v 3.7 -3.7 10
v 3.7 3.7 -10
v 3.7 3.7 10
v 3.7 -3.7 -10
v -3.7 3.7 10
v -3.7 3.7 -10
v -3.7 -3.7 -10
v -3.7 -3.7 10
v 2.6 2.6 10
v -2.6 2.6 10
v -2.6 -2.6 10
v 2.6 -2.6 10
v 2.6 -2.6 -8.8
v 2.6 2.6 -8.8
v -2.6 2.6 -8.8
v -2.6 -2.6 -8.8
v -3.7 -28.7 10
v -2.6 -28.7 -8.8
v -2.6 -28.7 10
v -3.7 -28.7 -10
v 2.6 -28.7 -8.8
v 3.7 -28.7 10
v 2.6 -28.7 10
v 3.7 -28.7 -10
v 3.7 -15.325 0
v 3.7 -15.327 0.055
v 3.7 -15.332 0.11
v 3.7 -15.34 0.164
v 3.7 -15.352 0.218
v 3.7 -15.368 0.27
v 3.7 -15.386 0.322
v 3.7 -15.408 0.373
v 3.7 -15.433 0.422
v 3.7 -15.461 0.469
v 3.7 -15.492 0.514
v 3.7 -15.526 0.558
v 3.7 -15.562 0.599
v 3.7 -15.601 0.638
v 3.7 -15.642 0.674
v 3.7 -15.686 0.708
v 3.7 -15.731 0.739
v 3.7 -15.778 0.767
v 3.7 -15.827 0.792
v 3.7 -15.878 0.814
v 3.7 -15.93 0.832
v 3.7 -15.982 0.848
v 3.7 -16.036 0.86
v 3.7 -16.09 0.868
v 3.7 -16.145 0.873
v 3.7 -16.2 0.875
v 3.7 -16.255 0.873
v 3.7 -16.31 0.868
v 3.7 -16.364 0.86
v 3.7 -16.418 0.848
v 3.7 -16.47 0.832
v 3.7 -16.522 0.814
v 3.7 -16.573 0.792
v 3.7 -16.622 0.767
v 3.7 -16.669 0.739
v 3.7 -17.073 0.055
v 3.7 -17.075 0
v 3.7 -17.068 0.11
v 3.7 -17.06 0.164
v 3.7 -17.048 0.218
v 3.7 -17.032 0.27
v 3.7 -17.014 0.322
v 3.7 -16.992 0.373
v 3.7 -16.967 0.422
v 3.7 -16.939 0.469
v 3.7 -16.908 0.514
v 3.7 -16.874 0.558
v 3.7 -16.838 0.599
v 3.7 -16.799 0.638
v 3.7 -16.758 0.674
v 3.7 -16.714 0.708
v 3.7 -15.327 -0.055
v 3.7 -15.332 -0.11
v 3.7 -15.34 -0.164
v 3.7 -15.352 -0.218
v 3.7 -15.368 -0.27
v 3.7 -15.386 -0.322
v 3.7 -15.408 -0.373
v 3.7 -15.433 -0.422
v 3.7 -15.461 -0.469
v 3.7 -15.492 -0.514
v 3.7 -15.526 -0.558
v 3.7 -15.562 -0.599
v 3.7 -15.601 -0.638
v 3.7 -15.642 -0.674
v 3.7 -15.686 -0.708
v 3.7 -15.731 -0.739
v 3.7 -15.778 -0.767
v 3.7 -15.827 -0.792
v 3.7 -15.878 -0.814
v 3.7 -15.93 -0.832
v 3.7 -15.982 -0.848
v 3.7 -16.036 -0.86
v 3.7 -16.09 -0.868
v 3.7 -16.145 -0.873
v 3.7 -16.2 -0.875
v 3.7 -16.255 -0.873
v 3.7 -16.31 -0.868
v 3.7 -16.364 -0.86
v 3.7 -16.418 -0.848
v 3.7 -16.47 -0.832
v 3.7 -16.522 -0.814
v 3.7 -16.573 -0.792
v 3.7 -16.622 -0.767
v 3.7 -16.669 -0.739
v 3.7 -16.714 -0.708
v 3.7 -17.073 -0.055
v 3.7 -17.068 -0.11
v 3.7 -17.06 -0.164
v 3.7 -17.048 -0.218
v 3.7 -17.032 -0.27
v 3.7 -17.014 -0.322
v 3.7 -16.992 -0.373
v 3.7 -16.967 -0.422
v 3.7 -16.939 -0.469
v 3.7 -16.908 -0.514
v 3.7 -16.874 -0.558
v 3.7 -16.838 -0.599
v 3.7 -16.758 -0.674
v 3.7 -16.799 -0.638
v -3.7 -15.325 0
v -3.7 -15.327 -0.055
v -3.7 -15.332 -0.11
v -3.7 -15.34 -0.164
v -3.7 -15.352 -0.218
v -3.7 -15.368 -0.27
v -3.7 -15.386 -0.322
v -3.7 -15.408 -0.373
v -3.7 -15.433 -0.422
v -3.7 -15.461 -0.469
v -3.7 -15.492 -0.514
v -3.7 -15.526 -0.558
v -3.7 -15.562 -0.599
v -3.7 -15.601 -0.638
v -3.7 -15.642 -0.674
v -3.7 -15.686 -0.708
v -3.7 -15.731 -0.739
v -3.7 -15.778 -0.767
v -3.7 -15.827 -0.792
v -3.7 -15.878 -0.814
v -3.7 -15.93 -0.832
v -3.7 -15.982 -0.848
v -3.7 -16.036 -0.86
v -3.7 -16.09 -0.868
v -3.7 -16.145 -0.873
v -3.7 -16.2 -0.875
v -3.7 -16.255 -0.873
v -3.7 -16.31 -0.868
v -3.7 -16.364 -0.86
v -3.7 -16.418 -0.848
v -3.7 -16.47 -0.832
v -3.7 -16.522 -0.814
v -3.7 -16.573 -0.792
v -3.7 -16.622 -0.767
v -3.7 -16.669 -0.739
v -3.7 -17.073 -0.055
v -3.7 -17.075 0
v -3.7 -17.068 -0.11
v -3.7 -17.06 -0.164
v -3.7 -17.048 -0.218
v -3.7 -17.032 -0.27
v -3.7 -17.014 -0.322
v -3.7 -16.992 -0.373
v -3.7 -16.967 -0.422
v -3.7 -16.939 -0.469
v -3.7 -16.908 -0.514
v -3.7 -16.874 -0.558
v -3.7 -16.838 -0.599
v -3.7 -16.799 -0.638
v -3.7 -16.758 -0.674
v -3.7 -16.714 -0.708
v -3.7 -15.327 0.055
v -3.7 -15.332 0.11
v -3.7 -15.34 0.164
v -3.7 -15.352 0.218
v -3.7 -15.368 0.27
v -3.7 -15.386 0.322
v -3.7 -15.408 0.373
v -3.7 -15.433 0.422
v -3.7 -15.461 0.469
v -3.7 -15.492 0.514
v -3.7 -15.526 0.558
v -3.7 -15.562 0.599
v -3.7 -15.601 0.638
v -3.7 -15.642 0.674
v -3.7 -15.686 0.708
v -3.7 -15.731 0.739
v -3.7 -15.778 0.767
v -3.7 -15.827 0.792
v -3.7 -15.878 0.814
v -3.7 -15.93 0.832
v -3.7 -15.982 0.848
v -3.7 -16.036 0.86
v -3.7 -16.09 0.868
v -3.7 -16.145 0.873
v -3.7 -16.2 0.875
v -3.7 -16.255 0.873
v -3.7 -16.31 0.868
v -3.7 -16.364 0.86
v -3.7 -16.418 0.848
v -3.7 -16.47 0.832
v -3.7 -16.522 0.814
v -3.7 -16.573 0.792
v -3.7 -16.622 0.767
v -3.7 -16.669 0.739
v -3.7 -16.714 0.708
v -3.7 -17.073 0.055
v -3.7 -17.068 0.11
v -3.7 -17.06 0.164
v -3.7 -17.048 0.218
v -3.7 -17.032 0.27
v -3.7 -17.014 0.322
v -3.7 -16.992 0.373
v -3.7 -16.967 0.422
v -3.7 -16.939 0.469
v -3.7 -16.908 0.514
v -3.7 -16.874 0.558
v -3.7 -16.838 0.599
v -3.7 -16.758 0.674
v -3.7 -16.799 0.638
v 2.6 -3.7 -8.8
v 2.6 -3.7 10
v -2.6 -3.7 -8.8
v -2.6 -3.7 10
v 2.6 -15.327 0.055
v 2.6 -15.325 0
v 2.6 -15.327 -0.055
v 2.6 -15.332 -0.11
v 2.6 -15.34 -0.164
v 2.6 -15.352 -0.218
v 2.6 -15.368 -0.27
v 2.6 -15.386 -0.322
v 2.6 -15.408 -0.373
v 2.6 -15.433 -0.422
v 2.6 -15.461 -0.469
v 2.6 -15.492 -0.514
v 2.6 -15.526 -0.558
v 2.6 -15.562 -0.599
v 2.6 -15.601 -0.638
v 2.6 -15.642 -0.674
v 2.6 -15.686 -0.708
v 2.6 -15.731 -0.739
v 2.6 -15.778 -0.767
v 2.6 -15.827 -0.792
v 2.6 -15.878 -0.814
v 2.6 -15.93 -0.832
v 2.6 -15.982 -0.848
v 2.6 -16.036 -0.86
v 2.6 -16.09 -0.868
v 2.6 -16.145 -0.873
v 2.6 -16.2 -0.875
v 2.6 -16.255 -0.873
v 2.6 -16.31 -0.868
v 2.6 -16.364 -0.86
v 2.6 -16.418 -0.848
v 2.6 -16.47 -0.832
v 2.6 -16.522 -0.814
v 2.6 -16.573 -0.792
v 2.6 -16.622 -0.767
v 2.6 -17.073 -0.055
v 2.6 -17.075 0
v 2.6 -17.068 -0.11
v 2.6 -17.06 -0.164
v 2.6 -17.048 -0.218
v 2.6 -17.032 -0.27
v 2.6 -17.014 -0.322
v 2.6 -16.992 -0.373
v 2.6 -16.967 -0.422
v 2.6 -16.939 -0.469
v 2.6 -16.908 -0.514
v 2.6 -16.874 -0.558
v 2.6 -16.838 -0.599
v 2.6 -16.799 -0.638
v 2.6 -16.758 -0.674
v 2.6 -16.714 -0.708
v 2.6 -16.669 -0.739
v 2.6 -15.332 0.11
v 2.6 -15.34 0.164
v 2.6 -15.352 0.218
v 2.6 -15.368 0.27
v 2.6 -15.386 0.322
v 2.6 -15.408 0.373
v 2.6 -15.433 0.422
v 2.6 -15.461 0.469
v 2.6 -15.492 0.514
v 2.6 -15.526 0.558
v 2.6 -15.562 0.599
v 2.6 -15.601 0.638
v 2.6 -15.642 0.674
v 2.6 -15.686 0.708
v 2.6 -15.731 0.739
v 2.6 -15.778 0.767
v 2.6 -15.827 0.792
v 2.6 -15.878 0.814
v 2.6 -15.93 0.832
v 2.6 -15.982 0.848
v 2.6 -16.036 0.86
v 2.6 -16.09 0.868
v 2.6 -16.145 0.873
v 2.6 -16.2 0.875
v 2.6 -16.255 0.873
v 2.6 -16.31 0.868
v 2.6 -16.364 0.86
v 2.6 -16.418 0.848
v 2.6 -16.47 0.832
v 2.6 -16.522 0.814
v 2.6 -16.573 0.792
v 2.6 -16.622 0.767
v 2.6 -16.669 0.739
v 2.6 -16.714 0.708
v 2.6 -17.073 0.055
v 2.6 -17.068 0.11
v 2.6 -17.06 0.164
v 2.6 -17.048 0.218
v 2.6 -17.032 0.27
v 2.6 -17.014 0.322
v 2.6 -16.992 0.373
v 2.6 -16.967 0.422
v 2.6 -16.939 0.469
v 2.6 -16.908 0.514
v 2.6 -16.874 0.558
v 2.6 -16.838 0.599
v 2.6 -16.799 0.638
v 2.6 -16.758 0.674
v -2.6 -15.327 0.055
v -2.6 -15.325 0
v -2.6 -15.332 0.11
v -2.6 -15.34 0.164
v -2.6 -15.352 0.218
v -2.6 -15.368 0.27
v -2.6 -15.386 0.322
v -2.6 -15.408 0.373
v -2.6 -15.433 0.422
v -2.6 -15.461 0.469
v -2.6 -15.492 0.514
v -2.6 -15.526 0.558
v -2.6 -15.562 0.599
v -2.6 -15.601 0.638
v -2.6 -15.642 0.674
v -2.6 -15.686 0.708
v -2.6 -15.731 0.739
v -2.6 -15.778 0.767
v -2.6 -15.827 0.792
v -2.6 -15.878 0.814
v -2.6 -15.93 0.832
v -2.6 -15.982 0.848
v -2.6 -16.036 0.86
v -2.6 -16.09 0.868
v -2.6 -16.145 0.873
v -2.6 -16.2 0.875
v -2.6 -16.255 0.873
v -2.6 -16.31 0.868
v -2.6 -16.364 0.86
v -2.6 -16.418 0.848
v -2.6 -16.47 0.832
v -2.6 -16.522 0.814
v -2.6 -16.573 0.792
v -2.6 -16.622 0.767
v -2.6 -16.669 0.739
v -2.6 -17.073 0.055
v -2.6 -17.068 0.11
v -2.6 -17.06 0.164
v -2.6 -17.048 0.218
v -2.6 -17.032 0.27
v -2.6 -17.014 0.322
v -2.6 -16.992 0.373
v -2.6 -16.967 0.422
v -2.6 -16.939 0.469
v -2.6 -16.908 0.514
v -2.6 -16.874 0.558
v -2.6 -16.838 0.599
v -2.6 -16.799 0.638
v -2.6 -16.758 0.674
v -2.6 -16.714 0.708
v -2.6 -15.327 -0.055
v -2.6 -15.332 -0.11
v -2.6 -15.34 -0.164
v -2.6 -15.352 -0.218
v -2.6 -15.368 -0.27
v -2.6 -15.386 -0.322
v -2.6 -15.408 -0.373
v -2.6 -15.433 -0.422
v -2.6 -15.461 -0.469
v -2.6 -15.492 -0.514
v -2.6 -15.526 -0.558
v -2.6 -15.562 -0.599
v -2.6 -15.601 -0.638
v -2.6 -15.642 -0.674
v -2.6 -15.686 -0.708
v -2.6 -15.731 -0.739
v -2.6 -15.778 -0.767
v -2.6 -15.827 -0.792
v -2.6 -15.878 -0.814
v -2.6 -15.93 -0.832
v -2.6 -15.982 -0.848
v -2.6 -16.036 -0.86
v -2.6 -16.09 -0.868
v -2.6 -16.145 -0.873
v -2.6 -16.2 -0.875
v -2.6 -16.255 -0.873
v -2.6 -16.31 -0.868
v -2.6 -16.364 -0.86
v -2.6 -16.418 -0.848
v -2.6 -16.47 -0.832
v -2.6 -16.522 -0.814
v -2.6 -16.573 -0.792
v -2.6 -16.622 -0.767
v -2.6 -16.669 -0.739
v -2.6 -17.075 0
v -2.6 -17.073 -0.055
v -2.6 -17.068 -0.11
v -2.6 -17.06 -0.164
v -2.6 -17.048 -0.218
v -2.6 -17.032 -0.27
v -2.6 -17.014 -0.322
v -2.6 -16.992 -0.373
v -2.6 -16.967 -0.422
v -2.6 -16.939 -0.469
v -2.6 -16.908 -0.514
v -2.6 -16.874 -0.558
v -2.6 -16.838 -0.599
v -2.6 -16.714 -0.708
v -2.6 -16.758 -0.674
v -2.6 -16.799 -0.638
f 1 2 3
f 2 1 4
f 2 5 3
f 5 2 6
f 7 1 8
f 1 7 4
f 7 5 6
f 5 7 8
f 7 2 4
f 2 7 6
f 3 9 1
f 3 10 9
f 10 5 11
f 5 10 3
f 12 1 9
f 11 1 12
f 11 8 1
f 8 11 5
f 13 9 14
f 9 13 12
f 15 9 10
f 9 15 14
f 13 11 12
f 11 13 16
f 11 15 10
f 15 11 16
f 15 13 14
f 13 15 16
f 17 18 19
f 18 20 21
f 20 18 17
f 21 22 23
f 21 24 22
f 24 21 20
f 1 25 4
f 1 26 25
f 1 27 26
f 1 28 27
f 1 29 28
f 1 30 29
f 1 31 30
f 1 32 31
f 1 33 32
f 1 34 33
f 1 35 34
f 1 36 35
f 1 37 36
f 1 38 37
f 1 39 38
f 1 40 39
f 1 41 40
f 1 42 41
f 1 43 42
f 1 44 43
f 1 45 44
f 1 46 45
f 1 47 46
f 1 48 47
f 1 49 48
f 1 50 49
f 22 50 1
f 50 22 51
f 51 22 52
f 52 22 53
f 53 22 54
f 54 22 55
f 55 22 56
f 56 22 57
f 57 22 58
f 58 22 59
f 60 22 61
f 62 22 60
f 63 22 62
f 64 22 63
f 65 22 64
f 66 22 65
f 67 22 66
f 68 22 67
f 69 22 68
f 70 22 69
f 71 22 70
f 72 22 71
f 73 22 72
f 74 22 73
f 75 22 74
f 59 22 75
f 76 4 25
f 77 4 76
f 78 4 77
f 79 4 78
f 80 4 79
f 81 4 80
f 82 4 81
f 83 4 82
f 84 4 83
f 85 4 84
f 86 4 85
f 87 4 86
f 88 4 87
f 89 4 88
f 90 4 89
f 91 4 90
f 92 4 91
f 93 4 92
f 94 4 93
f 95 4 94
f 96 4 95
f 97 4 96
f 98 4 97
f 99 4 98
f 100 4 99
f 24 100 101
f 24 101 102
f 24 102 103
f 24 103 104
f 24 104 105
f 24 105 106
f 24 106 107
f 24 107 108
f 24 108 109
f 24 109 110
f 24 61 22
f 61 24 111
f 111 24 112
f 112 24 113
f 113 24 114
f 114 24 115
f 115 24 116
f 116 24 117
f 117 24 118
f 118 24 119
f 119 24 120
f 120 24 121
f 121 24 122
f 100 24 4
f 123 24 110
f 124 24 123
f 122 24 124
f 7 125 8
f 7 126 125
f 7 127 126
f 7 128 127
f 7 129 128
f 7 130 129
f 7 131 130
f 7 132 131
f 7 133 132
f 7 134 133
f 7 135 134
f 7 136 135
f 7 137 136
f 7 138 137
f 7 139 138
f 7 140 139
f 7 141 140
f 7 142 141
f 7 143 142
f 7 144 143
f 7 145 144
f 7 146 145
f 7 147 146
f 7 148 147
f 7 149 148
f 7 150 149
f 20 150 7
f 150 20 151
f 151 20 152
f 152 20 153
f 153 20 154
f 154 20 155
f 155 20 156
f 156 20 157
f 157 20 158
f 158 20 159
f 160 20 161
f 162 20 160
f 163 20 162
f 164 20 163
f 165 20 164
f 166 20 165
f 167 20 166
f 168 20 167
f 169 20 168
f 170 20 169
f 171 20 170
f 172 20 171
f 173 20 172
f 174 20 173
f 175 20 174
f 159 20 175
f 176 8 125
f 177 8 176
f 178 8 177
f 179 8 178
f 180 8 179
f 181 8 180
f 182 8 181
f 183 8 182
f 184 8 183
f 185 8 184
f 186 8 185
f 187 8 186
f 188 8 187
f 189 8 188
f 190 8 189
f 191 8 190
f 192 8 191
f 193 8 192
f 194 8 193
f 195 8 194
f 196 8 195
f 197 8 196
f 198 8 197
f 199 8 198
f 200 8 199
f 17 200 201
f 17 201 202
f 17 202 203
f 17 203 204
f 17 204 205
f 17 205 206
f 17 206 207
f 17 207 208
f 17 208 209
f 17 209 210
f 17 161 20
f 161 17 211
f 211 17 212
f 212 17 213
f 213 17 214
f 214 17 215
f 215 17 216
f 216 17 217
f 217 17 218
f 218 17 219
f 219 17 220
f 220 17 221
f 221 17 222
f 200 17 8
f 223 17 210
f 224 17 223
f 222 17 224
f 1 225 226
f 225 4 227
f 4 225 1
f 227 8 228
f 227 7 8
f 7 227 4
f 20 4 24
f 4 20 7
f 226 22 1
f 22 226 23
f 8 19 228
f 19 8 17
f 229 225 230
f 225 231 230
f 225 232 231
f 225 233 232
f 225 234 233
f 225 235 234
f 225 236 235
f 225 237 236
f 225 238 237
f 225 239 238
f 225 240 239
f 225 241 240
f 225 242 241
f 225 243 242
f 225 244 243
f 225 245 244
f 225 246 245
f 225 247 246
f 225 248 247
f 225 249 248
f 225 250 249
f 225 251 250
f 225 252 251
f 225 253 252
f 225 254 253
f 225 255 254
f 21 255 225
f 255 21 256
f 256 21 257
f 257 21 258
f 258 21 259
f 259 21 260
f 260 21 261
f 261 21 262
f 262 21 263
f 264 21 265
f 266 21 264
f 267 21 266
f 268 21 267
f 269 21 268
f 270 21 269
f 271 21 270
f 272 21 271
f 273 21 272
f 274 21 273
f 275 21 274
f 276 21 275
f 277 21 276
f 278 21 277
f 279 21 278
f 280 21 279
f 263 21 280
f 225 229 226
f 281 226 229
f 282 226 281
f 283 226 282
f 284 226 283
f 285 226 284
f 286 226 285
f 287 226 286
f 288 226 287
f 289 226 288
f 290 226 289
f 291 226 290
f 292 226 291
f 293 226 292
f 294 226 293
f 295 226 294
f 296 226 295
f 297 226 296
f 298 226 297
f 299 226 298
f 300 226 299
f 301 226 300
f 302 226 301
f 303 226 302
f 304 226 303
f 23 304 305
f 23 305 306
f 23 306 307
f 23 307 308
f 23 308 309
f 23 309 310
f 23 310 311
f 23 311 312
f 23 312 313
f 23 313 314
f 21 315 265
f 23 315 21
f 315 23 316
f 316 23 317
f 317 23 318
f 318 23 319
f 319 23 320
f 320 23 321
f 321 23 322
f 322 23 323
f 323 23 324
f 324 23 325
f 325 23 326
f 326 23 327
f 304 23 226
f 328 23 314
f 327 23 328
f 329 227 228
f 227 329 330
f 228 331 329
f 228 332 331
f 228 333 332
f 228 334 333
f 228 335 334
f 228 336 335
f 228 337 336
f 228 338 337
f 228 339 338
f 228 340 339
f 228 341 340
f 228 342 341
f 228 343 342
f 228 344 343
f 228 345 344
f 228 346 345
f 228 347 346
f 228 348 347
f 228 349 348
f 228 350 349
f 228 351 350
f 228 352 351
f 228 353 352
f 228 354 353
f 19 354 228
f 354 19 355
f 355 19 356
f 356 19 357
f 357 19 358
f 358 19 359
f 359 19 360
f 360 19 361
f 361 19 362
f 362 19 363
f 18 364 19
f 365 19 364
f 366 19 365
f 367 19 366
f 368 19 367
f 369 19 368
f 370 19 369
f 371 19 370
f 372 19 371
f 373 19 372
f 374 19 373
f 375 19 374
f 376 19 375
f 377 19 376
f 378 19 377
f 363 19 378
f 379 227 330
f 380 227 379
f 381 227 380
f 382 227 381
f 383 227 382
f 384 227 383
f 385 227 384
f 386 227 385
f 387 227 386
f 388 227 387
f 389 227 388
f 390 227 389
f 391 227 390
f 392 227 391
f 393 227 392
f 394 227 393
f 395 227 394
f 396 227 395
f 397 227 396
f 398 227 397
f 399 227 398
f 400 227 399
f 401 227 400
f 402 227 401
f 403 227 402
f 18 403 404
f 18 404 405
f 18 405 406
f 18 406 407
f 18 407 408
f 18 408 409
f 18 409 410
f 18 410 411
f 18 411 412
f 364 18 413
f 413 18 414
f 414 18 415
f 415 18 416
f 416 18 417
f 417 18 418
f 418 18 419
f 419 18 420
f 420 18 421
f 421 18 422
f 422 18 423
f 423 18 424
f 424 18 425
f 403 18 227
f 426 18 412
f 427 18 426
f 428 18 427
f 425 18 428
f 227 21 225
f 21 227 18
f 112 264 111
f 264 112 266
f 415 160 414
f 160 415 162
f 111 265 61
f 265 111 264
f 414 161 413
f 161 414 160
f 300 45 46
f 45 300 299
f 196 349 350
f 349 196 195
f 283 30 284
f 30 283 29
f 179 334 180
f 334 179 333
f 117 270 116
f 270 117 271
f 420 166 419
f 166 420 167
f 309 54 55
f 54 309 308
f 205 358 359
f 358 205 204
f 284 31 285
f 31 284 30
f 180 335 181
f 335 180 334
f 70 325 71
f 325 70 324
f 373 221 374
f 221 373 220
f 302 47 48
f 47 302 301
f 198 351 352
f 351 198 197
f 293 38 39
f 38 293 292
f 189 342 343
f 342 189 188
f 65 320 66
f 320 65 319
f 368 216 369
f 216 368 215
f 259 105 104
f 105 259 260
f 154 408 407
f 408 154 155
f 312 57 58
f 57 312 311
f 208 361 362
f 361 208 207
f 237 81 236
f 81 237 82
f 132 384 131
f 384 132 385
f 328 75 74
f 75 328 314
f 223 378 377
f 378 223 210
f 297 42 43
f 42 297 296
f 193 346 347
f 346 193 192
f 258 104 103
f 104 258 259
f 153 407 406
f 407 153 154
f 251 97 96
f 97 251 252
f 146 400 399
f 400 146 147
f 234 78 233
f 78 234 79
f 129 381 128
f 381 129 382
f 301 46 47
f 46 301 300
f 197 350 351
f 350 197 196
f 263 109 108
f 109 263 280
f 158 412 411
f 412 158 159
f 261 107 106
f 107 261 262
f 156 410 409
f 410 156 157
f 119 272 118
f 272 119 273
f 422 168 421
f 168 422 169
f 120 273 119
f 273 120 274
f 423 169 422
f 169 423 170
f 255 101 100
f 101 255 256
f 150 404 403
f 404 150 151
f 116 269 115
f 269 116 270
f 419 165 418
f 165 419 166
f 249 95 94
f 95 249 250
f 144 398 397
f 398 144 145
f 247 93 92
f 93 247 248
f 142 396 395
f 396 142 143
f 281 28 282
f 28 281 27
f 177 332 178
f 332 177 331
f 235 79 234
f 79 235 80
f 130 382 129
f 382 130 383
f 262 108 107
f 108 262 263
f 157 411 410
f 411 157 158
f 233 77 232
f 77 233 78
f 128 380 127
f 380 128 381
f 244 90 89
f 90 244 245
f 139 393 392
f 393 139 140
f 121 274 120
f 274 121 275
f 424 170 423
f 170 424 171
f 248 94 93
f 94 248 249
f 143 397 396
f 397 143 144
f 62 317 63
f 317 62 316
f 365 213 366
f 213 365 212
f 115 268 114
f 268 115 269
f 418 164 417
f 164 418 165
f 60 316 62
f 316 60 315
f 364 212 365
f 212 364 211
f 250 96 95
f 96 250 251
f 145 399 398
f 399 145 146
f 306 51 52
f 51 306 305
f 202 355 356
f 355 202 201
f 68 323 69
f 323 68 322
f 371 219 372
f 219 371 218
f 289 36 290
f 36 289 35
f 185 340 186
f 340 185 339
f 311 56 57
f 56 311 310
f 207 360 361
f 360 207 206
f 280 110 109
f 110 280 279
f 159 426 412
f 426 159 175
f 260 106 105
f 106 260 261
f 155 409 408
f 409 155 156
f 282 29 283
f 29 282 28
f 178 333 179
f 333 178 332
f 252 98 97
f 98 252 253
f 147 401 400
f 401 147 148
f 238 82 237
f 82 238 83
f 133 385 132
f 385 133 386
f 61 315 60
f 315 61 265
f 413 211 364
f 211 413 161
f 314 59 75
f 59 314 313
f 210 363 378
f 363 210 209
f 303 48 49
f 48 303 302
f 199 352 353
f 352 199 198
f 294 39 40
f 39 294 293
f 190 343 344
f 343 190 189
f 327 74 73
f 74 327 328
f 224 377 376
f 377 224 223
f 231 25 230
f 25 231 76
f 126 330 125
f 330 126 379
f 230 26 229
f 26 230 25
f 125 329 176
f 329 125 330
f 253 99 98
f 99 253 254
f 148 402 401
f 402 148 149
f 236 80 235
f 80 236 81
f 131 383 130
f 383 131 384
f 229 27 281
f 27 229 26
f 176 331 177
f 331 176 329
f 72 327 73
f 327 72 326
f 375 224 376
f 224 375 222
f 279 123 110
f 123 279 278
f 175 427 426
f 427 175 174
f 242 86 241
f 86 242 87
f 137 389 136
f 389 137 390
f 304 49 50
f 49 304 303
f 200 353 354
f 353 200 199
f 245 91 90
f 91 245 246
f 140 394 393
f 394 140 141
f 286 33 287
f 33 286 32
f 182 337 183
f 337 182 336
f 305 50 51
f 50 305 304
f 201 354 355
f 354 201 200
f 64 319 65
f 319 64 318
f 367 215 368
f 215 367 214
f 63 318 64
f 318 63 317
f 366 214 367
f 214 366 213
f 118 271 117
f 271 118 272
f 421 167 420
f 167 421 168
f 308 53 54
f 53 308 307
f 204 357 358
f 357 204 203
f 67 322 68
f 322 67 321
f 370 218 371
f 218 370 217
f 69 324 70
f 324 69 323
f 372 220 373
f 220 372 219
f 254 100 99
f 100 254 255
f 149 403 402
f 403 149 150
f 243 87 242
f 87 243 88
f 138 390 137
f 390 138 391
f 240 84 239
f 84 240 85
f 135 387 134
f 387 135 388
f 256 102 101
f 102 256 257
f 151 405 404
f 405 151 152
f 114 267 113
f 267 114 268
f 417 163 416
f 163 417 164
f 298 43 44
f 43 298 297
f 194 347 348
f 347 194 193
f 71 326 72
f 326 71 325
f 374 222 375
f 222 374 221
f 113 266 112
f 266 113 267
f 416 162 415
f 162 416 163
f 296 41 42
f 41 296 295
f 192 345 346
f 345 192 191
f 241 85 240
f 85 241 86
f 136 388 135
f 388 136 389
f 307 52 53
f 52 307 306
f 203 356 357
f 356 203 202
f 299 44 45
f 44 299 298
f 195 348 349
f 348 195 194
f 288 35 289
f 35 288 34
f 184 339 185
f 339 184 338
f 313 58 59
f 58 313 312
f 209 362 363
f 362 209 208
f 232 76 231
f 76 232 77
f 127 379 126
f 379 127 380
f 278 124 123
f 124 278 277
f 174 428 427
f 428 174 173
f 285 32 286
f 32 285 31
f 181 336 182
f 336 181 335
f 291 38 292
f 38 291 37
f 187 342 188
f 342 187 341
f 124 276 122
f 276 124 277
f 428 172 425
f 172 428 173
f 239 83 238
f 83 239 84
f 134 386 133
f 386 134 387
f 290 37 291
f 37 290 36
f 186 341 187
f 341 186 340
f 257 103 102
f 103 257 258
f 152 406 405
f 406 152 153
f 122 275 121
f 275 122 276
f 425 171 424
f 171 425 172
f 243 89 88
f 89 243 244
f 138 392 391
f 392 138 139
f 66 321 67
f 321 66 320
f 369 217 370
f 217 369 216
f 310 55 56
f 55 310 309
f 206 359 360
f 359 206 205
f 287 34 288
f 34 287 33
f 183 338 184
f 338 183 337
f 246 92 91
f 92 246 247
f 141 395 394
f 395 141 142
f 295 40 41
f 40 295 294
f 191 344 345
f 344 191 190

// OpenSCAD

//celkovy cas: 4:07

//variables
/* [Hidden] */
//fragment number
$fn = 100;

/* [Main] */
//thickness of desks in mm
thickness_of_desks=5;
//thickness of walls in mm
thickness_of_walls = 1.2;
//length of connectors in mm
length_of_connectors = 25; 
//width of connectors 
width_of_connectors = 20;

number_of_connectors = 1; //[1:4]

secure_filament_thickness = 1.75; //[1.75,3.0]

/* [Addons] */
//Hinges or Arcs or Both - when both, arcs dont appear where hinge is
addons="none"; //[none,hinges,arcs,both]
// set on which axis you need hinges - this means the rotation of the connector in shelf
hinge_axis = "x"; //[x,y]

hinge_rotation = "up"; //[up,down]
//make sure customizer shows up all hinges(use rotation a lot, its a bit buggy)
hinges_positon="both_up";//[left_down,right_down,both_down,left_up,right_up,both_up,all]

arcs = (addons=="arcs" || addons=="both") ? true : false;

//arcs = true; //set to true if you want round shapes in the corner not recommended if building shelf with doors - using hinges, or with drawers

hinges = (addons=="hinges" || addons=="both") ? true : false;

//hinges = true; // set true if you want hinges for some door

hpos1 = ((hinges_positon=="right_up"||hinges_positon=="both_up"||hinges_positon=="all")&&(number_of_connectors==4 || (number_of_connectors==3 && hinge_axis =="y" )))? true:false; //position of hinge
hpos2 = (hinges_positon=="right_down"||hinges_positon=="both_down"||hinges_positon=="all")? true:false; //position of hinge
hpos3 = ((hinges_positon=="left_up"||hinges_positon=="both_up"||hinges_positon=="all")&&(number_of_connectors==4 || (number_of_connectors==3 && hinge_axis =="y" )))? true:false; //position of hinge
hpos4 = (hinges_positon=="left_down"||hinges_positon=="both_down"||hinges_positon=="all")? true:false; //position of hinge
rotate([-90,0,0])union(){

if(number_of_connectors==4){
  difference(){
cube([thickness_of_desks+(thickness_of_walls*2),width_of_connectors,thickness_of_desks+(thickness_of_walls*2)], center= true);
translate([0,-thickness_of_walls/2,0])cube([thickness_of_desks+2*thickness_of_walls,width_of_connectors-thickness_of_walls,thickness_of_desks+0.2], center= true);
translate([0,-thickness_of_walls/2,0])cube([thickness_of_desks+0.2,width_of_connectors-thickness_of_walls,thickness_of_desks+2*thickness_of_walls], center= true);}
}
else if(number_of_connectors==2){
difference(){
cube([thickness_of_desks+(thickness_of_walls*2),width_of_connectors,thickness_of_desks+(thickness_of_walls*2)], center= true);

translate([-(+thickness_of_walls)/2,-thickness_of_walls/2,0])cube([thickness_of_desks+thickness_of_walls+0.2,width_of_connectors-thickness_of_walls,thickness_of_desks+0.2], center= true);
translate([0,-thickness_of_walls/2,-(+thickness_of_walls)/2])cube([thickness_of_desks+0.2,width_of_connectors-thickness_of_walls,thickness_of_desks+thickness_of_walls+0.2], center= true);

}}
else if(number_of_connectors==3){
difference(){
cube([thickness_of_desks+(thickness_of_walls*2),width_of_connectors,thickness_of_desks+(thickness_of_walls*2)], center= true);
translate([0,-thickness_of_walls/2-0.5,0])cube([thickness_of_desks+0.2,width_of_connectors-thickness_of_walls+1,thickness_of_desks+2*thickness_of_walls+1], center= true);
translate([-thickness_of_desks+1,-thickness_of_walls/2-0.5,0])cube([thickness_of_desks+0.2,width_of_connectors-thickness_of_walls+1,thickness_of_desks+0.2], center= true);

}}
else if(number_of_connectors==1){
difference(){
cube([thickness_of_desks+(thickness_of_walls*2),width_of_connectors,thickness_of_desks+(thickness_of_walls*2)], center= true);
translate([0,-thickness_of_walls/2,0])cube([thickness_of_desks+0.2,width_of_connectors-thickness_of_walls,thickness_of_desks+0.2], center= true);

}}
for( i = [1 : number_of_connectors]){
   rotate([0,i*90,0])connector();
}

if(arcs==true && hinges_positon!="all" ){
    if((hpos1!=true && number_of_connectors ==4 && hinge_axis == "x")||(hpos2!=true && number_of_connectors ==4 && hinge_axis == "y") )
        rotate([0,4*90,0])arc();
    if((hpos2!=true && number_of_connectors >1&&hinge_axis == "x")||(hpos4!=true && number_of_connectors >1&&hinge_axis == "y"))
        rotate([0,1*90,0])arc();
    if((hpos3!=true && number_of_connectors>3&&hinge_axis == "x")||(hpos1!=true && number_of_connectors>3&&hinge_axis == "y"))
        rotate([0,3*90,0])arc();
    if((hpos4!=true && number_of_connectors>2&&hinge_axis == "x")||(hpos3 !=true && number_of_connectors>2 && hinge_axis == "y"))
        rotate([0,2*90,0])arc();
}
if(hinges==true){
rot=hinge_axis=="x"? 90:0;
hrot = hinge_rotation=="up"?0:(-length_of_connectors/4);
if(hpos1==true){
    translate([0,0,0
    ])rotate([0,rot,0])hinges(hrot);
}
if(hpos2==true){
    rotate([0,rot,0])translate([0,0,-thickness_of_desks/2-thickness_of_walls-length_of_connectors+length_of_connectors/4-length_of_connectors-thickness_of_desks/2-thickness_of_walls
    ])hinges(hrot);
}
if(hpos3==true){
    translate([0,-thickness_of_desks+width_of_connectors,0])rotate([0,-rot,180])hinges(hrot);
}
if(hpos4==true){
    rotate([0,-rot,180])translate([0,thickness_of_desks-width_of_connectors,-thickness_of_desks/2-thickness_of_walls-length_of_connectors+length_of_connectors/4-length_of_connectors-thickness_of_desks/2-thickness_of_walls])hinges(hrot);
}
}
}
module connector(){
    translate([(thickness_of_desks+(thickness_of_walls*2))/2,-width_of_connectors/2,-(thickness_of_desks+(thickness_of_walls*2))/2])difference(){
cube([length_of_connectors,width_of_connectors,thickness_of_desks+(thickness_of_walls*2)]);
translate([-0.5,-thickness_of_walls,thickness_of_walls-0.1])cube([length_of_connectors+0.5+1,width_of_connectors,thickness_of_desks+0.2]);
translate([length_of_connectors/2,width_of_connectors/2,-1])cylinder(h=thickness_of_desks+(thickness_of_walls*2+2), d=secure_filament_thickness );
}
}

module arc(){
translate([(0.1+(length_of_connectors/2)-secure_filament_thickness)+thickness_of_desks/2,width_of_connectors/2,-((0.1+(length_of_connectors/2)-secure_filament_thickness)+thickness_of_desks/2)])rotate([90,270,0])difference(){
intersection(){
union(){
cylinder(h=width_of_connectors, r = (length_of_connectors/2)-secure_filament_thickness);
cube([(length_of_connectors/2)-secure_filament_thickness,(length_of_connectors/2)-secure_filament_thickness,thickness_of_walls]);  
}
cube([(length_of_connectors/2)-secure_filament_thickness,(length_of_connectors/2)-secure_filament_thickness,width_of_connectors]);
}
translate([0,0,-1])cylinder(h=width_of_connectors+2, r = (length_of_connectors/2)-(secure_filament_thickness+thickness_of_walls-0.1));
}
}
module hinges(rotation){
translate([thickness_of_desks/2+thickness_of_walls,width_of_connectors/2-thickness_of_desks,thickness_of_desks/2+thickness_of_walls+length_of_connectors-length_of_connectors/4
    ])
union(){
    
translate([thickness_of_desks/2+thickness_of_walls,(thickness_of_desks-0.05)/2,rotation])
        cylinder(h=length_of_connectors/2, d=thickness_of_desks-0.05);
    
translate([0,0,0])cube([thickness_of_desks/2+thickness_of_walls,thickness_of_desks,length_of_connectors/4]);
}    

}

// preview[view:south west, tilt:top]
